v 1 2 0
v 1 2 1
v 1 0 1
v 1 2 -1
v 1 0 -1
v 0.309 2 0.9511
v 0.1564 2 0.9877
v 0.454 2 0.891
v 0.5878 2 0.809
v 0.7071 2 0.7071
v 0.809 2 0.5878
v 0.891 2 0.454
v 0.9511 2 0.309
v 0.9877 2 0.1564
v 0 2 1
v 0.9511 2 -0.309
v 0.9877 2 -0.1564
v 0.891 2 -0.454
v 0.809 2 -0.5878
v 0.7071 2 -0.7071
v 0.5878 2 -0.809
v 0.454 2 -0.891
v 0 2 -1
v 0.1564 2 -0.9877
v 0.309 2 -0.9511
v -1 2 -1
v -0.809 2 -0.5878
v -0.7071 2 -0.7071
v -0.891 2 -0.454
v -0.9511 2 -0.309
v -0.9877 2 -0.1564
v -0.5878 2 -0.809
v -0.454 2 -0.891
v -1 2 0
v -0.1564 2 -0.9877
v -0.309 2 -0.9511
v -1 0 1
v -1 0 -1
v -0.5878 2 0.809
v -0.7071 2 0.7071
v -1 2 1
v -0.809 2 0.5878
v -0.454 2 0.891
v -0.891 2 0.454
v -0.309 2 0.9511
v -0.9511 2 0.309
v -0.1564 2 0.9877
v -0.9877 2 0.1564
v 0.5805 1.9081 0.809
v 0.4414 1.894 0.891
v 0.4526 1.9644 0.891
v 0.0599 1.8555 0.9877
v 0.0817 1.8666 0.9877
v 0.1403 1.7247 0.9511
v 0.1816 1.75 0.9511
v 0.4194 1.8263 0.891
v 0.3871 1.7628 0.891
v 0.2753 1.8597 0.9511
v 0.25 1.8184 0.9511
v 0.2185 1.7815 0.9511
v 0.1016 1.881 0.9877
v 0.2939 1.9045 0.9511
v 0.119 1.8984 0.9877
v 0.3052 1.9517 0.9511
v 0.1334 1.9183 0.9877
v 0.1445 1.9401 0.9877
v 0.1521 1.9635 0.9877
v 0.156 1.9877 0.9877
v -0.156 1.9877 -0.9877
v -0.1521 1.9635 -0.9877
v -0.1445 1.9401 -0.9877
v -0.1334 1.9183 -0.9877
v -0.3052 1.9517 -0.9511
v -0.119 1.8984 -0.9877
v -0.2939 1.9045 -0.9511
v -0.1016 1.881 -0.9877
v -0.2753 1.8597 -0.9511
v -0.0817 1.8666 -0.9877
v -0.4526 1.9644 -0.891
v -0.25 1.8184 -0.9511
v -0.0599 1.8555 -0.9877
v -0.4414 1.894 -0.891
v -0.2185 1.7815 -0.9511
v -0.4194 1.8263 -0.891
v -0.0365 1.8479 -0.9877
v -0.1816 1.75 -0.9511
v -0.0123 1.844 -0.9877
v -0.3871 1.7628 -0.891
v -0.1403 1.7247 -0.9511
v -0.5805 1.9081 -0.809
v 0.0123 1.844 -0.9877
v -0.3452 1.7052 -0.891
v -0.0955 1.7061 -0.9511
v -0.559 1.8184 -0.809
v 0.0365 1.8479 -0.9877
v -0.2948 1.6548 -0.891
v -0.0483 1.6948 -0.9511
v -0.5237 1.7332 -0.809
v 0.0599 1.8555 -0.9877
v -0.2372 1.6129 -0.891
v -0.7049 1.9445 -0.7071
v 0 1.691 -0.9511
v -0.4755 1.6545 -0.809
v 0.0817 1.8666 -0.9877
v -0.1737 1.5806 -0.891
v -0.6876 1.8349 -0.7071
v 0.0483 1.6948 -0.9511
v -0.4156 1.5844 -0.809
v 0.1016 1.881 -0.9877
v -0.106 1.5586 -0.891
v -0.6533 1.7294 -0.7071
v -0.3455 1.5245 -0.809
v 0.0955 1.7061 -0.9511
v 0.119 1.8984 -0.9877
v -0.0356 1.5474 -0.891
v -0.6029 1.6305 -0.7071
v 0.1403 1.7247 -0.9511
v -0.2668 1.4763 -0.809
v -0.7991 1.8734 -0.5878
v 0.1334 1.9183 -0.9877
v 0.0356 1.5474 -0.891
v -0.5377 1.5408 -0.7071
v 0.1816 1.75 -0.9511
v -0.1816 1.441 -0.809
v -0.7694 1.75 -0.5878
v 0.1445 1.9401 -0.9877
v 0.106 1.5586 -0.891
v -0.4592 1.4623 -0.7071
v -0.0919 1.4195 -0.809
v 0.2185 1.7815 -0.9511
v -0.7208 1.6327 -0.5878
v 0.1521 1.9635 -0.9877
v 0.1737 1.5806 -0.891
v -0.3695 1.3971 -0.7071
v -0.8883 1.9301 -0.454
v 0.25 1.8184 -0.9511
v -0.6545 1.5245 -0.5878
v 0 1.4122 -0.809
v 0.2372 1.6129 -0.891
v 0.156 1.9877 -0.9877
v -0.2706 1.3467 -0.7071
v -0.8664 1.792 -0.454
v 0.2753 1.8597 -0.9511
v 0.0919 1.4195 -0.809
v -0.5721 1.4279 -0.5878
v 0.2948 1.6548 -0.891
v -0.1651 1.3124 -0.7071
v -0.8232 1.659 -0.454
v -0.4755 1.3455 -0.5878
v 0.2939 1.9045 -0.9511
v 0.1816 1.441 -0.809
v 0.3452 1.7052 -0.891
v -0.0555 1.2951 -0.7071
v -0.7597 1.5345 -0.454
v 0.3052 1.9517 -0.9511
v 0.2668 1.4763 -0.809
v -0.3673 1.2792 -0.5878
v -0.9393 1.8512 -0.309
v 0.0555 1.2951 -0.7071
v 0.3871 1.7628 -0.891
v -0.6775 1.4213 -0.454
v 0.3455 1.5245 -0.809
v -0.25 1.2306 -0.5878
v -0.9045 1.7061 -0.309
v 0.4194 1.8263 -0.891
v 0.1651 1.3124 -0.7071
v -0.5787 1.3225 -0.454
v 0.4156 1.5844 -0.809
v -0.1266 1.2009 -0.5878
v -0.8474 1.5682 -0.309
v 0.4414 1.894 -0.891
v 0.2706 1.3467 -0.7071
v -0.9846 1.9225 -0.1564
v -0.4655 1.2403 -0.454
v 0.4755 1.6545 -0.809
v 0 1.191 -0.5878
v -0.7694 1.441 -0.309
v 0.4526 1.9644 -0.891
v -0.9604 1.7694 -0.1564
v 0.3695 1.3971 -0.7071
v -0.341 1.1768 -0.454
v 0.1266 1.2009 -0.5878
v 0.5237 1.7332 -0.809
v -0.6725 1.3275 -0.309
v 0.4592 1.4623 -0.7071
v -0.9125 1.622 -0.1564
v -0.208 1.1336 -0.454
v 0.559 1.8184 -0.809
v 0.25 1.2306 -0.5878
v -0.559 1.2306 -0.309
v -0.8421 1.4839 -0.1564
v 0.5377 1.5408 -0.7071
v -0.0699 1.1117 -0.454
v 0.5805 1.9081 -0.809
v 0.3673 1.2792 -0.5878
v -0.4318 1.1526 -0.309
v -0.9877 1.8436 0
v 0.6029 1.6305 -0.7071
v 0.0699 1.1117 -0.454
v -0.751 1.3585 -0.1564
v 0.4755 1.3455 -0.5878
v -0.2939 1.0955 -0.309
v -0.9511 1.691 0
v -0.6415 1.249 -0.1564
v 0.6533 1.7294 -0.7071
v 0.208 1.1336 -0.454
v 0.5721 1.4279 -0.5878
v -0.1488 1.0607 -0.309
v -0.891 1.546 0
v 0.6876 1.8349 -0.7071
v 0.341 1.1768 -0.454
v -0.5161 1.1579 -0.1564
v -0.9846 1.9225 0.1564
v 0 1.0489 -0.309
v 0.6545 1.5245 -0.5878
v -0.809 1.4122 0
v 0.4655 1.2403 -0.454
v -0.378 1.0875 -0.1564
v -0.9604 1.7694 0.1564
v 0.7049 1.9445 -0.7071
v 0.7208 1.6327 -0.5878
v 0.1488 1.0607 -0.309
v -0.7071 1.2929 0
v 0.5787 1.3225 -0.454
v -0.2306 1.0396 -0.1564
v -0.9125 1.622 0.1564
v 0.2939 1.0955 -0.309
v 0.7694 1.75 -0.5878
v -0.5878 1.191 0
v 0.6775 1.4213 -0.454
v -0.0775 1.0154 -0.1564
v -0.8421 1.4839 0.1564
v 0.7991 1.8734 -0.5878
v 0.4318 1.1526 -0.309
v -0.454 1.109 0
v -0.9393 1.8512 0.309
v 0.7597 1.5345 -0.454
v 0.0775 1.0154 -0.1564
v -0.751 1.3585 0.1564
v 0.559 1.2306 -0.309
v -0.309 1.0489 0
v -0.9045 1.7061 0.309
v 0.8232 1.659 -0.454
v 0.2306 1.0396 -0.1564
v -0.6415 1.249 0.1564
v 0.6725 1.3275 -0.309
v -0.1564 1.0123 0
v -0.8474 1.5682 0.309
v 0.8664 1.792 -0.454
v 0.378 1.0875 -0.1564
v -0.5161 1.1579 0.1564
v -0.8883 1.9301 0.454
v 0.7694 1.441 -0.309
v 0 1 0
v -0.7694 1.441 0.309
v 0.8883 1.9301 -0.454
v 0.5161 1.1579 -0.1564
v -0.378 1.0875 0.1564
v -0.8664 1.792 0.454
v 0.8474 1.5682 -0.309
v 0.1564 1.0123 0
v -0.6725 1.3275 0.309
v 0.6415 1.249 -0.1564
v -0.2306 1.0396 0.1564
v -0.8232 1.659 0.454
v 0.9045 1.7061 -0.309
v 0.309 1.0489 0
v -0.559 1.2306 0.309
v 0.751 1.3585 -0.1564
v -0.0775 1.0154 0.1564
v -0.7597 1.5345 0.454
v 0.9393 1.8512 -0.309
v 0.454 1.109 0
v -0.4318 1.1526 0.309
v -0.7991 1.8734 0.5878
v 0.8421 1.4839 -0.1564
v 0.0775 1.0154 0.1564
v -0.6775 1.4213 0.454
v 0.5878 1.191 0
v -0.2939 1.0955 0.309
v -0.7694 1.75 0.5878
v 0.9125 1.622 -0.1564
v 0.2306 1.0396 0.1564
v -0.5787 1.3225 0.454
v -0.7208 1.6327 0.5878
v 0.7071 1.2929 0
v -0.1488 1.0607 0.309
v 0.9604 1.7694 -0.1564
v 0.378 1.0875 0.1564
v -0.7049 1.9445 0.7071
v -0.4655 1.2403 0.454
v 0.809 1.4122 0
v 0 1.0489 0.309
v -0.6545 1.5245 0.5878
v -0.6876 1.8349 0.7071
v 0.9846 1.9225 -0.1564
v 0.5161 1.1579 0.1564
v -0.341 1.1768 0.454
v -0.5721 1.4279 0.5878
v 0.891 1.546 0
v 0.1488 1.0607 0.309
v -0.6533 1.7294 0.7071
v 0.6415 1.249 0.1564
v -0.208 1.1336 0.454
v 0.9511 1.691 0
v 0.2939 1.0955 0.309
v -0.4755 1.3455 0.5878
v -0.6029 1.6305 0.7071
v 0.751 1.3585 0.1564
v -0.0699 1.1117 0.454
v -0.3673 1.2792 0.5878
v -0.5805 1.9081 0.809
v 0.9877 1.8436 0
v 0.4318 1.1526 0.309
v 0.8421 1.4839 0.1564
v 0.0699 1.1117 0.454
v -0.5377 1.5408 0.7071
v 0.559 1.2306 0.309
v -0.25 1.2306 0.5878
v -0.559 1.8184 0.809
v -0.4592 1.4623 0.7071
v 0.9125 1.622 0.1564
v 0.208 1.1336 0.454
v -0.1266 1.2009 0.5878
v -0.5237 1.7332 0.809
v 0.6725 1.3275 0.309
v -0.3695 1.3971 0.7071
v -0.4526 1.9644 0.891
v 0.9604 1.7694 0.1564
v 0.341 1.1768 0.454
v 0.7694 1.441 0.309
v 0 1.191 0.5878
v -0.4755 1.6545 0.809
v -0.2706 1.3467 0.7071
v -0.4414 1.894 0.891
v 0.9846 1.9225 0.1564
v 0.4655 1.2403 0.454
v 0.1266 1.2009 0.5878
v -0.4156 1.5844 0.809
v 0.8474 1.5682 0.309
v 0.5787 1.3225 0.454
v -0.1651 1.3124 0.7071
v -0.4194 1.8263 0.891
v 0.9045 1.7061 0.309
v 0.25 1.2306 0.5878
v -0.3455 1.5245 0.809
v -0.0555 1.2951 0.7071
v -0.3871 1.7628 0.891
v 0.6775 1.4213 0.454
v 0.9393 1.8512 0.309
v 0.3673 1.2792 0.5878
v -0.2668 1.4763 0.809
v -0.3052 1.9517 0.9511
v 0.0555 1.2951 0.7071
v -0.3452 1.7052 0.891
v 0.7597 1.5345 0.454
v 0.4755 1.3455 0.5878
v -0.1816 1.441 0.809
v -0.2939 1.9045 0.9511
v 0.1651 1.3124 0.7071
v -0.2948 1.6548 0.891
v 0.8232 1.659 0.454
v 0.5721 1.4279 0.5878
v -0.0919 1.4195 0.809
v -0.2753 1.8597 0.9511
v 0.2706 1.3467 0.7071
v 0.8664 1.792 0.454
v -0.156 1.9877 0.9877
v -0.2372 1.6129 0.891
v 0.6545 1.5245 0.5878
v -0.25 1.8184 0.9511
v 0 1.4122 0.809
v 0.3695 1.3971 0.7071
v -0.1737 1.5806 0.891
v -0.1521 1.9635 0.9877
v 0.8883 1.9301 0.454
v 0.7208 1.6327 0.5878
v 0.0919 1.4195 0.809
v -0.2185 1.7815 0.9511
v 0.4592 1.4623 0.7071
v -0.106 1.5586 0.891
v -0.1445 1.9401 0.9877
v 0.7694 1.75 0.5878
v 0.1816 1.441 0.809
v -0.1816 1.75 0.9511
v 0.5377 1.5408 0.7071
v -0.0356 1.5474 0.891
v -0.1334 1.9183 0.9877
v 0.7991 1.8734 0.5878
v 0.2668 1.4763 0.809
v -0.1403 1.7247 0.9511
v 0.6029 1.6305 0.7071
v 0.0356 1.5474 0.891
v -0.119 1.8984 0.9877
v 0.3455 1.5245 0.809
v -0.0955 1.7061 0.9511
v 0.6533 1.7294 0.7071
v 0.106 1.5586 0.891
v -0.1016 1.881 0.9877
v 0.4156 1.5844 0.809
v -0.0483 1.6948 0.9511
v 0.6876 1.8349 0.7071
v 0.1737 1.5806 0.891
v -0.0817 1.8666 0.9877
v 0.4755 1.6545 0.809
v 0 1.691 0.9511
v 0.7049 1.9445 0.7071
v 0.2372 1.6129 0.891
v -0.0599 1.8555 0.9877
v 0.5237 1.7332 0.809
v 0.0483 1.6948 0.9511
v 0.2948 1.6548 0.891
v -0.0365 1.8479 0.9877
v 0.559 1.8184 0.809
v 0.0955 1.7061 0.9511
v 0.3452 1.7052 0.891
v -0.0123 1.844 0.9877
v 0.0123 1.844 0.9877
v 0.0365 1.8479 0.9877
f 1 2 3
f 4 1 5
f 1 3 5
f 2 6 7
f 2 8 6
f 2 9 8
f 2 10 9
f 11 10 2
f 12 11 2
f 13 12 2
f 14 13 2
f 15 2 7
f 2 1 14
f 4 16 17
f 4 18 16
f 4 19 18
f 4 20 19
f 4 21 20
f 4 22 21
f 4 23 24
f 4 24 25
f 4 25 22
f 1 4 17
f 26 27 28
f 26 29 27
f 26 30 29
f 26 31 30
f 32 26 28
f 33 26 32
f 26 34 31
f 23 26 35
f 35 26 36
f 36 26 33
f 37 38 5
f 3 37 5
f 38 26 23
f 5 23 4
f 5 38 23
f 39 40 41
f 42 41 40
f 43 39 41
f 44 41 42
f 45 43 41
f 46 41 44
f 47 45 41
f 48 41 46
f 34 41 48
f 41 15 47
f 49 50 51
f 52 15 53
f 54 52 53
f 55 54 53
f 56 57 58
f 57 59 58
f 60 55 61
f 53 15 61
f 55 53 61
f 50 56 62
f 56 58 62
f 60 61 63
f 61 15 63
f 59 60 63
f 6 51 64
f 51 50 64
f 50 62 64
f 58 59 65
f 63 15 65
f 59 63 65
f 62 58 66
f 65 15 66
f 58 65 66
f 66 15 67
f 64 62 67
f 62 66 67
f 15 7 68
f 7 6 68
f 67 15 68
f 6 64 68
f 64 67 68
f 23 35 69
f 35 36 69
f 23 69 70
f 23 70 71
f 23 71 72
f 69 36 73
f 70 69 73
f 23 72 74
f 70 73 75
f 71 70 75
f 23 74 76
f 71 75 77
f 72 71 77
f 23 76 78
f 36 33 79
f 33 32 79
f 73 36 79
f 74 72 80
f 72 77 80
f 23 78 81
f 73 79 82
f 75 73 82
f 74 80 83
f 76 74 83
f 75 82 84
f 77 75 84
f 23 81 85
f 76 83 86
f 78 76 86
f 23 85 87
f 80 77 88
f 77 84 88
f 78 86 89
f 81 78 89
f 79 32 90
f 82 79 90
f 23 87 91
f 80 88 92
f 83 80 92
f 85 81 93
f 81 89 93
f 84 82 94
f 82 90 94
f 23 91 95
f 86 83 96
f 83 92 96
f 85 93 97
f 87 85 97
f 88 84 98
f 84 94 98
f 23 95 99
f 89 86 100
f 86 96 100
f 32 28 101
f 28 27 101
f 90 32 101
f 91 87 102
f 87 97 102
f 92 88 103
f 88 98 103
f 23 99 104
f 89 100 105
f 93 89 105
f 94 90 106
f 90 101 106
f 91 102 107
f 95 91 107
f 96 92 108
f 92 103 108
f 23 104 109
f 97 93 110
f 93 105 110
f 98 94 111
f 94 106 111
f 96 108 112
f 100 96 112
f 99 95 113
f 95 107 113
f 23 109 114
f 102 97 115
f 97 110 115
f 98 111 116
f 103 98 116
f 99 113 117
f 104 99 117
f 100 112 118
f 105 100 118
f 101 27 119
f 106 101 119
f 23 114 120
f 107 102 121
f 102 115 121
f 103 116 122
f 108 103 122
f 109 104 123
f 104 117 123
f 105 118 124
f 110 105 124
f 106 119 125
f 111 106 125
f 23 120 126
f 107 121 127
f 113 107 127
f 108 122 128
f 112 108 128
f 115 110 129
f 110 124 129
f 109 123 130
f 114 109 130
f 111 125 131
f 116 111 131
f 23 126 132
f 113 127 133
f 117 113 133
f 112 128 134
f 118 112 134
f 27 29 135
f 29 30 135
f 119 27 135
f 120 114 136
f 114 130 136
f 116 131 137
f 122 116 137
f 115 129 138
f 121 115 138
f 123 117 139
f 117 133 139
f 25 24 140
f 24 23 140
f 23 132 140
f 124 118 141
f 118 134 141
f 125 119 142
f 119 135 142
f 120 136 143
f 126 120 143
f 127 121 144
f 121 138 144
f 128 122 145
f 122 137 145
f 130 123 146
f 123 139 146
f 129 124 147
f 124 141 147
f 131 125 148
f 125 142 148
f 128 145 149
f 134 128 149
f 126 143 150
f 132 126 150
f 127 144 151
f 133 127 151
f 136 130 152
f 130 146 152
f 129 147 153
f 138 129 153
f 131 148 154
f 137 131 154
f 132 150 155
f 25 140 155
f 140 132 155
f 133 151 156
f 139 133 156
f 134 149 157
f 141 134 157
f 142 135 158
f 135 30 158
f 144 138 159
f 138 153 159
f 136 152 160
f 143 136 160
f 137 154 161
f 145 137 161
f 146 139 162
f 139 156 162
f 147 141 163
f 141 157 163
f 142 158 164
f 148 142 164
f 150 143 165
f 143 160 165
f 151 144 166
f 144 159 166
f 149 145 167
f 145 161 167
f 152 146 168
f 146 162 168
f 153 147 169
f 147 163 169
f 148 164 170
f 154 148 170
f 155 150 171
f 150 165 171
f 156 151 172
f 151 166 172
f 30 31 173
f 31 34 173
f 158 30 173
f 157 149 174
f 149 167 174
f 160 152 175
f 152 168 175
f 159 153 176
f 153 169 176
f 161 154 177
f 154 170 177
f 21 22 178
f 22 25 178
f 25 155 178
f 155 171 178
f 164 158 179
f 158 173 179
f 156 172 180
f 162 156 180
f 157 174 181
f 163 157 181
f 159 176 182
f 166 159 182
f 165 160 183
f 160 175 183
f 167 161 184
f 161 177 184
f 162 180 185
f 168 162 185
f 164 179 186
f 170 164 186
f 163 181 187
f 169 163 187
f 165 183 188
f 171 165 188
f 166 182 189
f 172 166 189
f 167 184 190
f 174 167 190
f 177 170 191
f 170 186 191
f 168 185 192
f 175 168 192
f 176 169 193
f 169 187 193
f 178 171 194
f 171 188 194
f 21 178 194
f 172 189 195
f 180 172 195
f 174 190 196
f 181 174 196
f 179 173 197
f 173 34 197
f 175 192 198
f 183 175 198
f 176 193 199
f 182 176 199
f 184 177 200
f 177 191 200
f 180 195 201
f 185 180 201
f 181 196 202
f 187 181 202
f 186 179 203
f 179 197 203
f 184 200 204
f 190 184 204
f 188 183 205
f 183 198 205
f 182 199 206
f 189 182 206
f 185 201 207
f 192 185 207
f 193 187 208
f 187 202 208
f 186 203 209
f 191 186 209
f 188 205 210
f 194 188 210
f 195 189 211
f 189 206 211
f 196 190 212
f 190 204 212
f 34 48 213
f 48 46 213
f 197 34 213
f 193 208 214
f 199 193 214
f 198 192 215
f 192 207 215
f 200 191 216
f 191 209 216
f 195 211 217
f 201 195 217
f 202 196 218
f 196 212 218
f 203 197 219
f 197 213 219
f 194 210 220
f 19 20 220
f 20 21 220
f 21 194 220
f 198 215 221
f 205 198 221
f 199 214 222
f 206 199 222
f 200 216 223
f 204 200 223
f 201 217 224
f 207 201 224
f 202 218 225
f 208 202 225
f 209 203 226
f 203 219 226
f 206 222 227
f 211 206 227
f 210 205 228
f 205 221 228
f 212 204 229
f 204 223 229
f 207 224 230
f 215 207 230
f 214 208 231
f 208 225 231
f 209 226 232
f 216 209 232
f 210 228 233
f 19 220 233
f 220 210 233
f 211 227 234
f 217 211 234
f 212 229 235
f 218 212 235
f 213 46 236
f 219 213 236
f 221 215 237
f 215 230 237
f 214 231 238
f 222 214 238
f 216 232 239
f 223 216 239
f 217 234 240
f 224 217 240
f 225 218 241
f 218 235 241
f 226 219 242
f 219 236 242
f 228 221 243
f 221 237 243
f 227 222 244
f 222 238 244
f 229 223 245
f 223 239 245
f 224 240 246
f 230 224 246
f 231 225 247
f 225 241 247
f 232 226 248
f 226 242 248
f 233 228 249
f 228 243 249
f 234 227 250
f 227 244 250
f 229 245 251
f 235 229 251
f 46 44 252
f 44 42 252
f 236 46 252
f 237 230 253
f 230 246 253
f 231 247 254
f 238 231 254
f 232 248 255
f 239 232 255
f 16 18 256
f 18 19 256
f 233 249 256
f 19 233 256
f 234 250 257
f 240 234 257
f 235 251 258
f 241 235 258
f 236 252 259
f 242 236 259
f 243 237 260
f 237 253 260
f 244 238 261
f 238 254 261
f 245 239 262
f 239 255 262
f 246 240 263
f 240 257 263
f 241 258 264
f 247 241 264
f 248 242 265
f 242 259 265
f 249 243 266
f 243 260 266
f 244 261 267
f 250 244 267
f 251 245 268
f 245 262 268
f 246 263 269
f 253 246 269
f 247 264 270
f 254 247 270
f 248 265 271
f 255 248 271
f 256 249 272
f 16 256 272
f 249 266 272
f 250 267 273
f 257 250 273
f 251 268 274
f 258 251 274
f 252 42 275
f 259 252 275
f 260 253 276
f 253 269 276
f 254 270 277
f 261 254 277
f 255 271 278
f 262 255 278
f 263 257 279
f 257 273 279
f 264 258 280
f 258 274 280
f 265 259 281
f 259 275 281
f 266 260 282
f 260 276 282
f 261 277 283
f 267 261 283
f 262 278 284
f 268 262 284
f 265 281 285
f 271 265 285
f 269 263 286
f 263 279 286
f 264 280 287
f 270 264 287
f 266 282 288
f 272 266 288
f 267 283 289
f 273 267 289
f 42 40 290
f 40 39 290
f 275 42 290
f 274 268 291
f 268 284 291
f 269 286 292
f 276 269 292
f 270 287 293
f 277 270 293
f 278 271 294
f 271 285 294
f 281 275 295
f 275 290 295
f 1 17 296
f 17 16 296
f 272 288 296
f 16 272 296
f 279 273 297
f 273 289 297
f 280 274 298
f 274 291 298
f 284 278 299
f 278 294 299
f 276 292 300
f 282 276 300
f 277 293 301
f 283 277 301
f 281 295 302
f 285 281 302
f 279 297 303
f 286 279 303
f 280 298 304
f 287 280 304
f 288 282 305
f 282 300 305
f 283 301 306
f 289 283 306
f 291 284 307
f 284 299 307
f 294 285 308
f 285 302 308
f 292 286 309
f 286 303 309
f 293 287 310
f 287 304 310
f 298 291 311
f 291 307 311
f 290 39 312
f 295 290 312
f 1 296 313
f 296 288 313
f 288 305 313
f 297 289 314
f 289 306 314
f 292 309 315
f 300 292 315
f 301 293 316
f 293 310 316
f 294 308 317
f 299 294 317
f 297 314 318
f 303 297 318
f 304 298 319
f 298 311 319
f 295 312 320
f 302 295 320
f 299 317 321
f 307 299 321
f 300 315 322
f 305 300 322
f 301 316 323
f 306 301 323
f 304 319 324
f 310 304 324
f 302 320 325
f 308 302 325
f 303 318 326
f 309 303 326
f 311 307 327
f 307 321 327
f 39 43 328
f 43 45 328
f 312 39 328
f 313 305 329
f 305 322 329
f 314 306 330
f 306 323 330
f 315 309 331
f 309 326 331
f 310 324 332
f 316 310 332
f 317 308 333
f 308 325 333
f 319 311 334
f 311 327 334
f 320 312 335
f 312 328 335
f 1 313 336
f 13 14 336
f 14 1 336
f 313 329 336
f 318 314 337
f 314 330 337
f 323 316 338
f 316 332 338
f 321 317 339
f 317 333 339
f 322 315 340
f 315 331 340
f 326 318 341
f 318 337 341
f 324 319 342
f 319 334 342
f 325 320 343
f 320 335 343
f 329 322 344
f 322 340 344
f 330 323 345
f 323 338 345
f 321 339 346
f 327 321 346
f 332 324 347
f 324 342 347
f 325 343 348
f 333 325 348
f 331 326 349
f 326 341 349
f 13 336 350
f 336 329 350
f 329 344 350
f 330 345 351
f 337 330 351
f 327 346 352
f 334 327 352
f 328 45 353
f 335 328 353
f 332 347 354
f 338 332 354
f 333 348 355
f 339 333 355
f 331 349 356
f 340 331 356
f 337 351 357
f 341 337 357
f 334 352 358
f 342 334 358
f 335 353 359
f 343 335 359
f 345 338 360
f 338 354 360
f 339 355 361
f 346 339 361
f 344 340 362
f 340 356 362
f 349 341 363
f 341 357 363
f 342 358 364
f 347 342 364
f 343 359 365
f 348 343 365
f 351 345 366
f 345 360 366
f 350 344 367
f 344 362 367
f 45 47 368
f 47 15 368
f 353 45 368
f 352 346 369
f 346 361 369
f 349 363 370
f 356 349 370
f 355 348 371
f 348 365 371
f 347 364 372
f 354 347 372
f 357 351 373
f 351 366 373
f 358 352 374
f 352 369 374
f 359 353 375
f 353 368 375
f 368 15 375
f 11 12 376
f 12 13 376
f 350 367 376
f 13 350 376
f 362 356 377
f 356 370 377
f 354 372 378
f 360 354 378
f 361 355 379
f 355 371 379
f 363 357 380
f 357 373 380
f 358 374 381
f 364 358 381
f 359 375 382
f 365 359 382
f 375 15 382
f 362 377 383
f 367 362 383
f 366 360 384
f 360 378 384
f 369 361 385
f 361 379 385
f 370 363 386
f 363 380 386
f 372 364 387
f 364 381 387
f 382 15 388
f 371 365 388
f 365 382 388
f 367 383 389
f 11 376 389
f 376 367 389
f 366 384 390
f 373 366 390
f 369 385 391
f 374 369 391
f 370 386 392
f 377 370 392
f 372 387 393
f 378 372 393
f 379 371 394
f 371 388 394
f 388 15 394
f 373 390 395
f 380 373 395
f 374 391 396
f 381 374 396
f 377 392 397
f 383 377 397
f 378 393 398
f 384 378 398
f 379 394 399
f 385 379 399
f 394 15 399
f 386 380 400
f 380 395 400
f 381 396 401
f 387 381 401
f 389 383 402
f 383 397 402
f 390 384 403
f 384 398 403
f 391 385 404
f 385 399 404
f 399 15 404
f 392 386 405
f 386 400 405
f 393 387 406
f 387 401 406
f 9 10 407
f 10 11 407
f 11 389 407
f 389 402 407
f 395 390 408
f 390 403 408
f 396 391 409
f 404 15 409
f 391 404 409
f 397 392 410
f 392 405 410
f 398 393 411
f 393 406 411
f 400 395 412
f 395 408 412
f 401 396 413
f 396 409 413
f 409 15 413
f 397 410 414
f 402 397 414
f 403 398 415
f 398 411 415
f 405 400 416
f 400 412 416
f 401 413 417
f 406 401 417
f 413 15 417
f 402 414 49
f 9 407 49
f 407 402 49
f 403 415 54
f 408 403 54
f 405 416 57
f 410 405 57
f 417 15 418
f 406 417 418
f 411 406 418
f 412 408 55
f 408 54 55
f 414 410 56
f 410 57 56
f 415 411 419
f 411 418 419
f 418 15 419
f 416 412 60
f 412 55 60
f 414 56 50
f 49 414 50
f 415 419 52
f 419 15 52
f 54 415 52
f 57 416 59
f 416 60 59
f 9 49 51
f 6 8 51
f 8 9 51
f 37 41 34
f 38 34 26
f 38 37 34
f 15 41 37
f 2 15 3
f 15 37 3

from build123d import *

# Parameters (mm, degrees)
SKETCH1_W           = 2
SKETCH1_H           = 2
BOSS_EXTRUDE1_DEPTH = 2


with BuildPart() as part:
    # Sketch1 → Boss-Extrude1 (new body)
    with BuildSketch(Plane(origin=(0, 0, 0), x_dir=(1, 0, 0), z_dir=(0, 1, 0))):
        Rectangle(SKETCH1_W, SKETCH1_H)
    extrude(amount=BOSS_EXTRUDE1_DEPTH)

    # Sketch2 → Cut-Revolve1 (revolve, cut)
    with BuildSketch(Plane(origin=(0, 2, 0), x_dir=(1, 0, 0), z_dir=(0, 1, 0))):
        with BuildLine():
            Line((0, -1), (0, 1))
            ThreePointArc((0, 1), (-1, 0), (0, -1))
        make_face()
    revolve(axis=Axis((0, 2, -1), (0, 0, 1)), mode=Mode.SUBTRACT)


solid = part.part
